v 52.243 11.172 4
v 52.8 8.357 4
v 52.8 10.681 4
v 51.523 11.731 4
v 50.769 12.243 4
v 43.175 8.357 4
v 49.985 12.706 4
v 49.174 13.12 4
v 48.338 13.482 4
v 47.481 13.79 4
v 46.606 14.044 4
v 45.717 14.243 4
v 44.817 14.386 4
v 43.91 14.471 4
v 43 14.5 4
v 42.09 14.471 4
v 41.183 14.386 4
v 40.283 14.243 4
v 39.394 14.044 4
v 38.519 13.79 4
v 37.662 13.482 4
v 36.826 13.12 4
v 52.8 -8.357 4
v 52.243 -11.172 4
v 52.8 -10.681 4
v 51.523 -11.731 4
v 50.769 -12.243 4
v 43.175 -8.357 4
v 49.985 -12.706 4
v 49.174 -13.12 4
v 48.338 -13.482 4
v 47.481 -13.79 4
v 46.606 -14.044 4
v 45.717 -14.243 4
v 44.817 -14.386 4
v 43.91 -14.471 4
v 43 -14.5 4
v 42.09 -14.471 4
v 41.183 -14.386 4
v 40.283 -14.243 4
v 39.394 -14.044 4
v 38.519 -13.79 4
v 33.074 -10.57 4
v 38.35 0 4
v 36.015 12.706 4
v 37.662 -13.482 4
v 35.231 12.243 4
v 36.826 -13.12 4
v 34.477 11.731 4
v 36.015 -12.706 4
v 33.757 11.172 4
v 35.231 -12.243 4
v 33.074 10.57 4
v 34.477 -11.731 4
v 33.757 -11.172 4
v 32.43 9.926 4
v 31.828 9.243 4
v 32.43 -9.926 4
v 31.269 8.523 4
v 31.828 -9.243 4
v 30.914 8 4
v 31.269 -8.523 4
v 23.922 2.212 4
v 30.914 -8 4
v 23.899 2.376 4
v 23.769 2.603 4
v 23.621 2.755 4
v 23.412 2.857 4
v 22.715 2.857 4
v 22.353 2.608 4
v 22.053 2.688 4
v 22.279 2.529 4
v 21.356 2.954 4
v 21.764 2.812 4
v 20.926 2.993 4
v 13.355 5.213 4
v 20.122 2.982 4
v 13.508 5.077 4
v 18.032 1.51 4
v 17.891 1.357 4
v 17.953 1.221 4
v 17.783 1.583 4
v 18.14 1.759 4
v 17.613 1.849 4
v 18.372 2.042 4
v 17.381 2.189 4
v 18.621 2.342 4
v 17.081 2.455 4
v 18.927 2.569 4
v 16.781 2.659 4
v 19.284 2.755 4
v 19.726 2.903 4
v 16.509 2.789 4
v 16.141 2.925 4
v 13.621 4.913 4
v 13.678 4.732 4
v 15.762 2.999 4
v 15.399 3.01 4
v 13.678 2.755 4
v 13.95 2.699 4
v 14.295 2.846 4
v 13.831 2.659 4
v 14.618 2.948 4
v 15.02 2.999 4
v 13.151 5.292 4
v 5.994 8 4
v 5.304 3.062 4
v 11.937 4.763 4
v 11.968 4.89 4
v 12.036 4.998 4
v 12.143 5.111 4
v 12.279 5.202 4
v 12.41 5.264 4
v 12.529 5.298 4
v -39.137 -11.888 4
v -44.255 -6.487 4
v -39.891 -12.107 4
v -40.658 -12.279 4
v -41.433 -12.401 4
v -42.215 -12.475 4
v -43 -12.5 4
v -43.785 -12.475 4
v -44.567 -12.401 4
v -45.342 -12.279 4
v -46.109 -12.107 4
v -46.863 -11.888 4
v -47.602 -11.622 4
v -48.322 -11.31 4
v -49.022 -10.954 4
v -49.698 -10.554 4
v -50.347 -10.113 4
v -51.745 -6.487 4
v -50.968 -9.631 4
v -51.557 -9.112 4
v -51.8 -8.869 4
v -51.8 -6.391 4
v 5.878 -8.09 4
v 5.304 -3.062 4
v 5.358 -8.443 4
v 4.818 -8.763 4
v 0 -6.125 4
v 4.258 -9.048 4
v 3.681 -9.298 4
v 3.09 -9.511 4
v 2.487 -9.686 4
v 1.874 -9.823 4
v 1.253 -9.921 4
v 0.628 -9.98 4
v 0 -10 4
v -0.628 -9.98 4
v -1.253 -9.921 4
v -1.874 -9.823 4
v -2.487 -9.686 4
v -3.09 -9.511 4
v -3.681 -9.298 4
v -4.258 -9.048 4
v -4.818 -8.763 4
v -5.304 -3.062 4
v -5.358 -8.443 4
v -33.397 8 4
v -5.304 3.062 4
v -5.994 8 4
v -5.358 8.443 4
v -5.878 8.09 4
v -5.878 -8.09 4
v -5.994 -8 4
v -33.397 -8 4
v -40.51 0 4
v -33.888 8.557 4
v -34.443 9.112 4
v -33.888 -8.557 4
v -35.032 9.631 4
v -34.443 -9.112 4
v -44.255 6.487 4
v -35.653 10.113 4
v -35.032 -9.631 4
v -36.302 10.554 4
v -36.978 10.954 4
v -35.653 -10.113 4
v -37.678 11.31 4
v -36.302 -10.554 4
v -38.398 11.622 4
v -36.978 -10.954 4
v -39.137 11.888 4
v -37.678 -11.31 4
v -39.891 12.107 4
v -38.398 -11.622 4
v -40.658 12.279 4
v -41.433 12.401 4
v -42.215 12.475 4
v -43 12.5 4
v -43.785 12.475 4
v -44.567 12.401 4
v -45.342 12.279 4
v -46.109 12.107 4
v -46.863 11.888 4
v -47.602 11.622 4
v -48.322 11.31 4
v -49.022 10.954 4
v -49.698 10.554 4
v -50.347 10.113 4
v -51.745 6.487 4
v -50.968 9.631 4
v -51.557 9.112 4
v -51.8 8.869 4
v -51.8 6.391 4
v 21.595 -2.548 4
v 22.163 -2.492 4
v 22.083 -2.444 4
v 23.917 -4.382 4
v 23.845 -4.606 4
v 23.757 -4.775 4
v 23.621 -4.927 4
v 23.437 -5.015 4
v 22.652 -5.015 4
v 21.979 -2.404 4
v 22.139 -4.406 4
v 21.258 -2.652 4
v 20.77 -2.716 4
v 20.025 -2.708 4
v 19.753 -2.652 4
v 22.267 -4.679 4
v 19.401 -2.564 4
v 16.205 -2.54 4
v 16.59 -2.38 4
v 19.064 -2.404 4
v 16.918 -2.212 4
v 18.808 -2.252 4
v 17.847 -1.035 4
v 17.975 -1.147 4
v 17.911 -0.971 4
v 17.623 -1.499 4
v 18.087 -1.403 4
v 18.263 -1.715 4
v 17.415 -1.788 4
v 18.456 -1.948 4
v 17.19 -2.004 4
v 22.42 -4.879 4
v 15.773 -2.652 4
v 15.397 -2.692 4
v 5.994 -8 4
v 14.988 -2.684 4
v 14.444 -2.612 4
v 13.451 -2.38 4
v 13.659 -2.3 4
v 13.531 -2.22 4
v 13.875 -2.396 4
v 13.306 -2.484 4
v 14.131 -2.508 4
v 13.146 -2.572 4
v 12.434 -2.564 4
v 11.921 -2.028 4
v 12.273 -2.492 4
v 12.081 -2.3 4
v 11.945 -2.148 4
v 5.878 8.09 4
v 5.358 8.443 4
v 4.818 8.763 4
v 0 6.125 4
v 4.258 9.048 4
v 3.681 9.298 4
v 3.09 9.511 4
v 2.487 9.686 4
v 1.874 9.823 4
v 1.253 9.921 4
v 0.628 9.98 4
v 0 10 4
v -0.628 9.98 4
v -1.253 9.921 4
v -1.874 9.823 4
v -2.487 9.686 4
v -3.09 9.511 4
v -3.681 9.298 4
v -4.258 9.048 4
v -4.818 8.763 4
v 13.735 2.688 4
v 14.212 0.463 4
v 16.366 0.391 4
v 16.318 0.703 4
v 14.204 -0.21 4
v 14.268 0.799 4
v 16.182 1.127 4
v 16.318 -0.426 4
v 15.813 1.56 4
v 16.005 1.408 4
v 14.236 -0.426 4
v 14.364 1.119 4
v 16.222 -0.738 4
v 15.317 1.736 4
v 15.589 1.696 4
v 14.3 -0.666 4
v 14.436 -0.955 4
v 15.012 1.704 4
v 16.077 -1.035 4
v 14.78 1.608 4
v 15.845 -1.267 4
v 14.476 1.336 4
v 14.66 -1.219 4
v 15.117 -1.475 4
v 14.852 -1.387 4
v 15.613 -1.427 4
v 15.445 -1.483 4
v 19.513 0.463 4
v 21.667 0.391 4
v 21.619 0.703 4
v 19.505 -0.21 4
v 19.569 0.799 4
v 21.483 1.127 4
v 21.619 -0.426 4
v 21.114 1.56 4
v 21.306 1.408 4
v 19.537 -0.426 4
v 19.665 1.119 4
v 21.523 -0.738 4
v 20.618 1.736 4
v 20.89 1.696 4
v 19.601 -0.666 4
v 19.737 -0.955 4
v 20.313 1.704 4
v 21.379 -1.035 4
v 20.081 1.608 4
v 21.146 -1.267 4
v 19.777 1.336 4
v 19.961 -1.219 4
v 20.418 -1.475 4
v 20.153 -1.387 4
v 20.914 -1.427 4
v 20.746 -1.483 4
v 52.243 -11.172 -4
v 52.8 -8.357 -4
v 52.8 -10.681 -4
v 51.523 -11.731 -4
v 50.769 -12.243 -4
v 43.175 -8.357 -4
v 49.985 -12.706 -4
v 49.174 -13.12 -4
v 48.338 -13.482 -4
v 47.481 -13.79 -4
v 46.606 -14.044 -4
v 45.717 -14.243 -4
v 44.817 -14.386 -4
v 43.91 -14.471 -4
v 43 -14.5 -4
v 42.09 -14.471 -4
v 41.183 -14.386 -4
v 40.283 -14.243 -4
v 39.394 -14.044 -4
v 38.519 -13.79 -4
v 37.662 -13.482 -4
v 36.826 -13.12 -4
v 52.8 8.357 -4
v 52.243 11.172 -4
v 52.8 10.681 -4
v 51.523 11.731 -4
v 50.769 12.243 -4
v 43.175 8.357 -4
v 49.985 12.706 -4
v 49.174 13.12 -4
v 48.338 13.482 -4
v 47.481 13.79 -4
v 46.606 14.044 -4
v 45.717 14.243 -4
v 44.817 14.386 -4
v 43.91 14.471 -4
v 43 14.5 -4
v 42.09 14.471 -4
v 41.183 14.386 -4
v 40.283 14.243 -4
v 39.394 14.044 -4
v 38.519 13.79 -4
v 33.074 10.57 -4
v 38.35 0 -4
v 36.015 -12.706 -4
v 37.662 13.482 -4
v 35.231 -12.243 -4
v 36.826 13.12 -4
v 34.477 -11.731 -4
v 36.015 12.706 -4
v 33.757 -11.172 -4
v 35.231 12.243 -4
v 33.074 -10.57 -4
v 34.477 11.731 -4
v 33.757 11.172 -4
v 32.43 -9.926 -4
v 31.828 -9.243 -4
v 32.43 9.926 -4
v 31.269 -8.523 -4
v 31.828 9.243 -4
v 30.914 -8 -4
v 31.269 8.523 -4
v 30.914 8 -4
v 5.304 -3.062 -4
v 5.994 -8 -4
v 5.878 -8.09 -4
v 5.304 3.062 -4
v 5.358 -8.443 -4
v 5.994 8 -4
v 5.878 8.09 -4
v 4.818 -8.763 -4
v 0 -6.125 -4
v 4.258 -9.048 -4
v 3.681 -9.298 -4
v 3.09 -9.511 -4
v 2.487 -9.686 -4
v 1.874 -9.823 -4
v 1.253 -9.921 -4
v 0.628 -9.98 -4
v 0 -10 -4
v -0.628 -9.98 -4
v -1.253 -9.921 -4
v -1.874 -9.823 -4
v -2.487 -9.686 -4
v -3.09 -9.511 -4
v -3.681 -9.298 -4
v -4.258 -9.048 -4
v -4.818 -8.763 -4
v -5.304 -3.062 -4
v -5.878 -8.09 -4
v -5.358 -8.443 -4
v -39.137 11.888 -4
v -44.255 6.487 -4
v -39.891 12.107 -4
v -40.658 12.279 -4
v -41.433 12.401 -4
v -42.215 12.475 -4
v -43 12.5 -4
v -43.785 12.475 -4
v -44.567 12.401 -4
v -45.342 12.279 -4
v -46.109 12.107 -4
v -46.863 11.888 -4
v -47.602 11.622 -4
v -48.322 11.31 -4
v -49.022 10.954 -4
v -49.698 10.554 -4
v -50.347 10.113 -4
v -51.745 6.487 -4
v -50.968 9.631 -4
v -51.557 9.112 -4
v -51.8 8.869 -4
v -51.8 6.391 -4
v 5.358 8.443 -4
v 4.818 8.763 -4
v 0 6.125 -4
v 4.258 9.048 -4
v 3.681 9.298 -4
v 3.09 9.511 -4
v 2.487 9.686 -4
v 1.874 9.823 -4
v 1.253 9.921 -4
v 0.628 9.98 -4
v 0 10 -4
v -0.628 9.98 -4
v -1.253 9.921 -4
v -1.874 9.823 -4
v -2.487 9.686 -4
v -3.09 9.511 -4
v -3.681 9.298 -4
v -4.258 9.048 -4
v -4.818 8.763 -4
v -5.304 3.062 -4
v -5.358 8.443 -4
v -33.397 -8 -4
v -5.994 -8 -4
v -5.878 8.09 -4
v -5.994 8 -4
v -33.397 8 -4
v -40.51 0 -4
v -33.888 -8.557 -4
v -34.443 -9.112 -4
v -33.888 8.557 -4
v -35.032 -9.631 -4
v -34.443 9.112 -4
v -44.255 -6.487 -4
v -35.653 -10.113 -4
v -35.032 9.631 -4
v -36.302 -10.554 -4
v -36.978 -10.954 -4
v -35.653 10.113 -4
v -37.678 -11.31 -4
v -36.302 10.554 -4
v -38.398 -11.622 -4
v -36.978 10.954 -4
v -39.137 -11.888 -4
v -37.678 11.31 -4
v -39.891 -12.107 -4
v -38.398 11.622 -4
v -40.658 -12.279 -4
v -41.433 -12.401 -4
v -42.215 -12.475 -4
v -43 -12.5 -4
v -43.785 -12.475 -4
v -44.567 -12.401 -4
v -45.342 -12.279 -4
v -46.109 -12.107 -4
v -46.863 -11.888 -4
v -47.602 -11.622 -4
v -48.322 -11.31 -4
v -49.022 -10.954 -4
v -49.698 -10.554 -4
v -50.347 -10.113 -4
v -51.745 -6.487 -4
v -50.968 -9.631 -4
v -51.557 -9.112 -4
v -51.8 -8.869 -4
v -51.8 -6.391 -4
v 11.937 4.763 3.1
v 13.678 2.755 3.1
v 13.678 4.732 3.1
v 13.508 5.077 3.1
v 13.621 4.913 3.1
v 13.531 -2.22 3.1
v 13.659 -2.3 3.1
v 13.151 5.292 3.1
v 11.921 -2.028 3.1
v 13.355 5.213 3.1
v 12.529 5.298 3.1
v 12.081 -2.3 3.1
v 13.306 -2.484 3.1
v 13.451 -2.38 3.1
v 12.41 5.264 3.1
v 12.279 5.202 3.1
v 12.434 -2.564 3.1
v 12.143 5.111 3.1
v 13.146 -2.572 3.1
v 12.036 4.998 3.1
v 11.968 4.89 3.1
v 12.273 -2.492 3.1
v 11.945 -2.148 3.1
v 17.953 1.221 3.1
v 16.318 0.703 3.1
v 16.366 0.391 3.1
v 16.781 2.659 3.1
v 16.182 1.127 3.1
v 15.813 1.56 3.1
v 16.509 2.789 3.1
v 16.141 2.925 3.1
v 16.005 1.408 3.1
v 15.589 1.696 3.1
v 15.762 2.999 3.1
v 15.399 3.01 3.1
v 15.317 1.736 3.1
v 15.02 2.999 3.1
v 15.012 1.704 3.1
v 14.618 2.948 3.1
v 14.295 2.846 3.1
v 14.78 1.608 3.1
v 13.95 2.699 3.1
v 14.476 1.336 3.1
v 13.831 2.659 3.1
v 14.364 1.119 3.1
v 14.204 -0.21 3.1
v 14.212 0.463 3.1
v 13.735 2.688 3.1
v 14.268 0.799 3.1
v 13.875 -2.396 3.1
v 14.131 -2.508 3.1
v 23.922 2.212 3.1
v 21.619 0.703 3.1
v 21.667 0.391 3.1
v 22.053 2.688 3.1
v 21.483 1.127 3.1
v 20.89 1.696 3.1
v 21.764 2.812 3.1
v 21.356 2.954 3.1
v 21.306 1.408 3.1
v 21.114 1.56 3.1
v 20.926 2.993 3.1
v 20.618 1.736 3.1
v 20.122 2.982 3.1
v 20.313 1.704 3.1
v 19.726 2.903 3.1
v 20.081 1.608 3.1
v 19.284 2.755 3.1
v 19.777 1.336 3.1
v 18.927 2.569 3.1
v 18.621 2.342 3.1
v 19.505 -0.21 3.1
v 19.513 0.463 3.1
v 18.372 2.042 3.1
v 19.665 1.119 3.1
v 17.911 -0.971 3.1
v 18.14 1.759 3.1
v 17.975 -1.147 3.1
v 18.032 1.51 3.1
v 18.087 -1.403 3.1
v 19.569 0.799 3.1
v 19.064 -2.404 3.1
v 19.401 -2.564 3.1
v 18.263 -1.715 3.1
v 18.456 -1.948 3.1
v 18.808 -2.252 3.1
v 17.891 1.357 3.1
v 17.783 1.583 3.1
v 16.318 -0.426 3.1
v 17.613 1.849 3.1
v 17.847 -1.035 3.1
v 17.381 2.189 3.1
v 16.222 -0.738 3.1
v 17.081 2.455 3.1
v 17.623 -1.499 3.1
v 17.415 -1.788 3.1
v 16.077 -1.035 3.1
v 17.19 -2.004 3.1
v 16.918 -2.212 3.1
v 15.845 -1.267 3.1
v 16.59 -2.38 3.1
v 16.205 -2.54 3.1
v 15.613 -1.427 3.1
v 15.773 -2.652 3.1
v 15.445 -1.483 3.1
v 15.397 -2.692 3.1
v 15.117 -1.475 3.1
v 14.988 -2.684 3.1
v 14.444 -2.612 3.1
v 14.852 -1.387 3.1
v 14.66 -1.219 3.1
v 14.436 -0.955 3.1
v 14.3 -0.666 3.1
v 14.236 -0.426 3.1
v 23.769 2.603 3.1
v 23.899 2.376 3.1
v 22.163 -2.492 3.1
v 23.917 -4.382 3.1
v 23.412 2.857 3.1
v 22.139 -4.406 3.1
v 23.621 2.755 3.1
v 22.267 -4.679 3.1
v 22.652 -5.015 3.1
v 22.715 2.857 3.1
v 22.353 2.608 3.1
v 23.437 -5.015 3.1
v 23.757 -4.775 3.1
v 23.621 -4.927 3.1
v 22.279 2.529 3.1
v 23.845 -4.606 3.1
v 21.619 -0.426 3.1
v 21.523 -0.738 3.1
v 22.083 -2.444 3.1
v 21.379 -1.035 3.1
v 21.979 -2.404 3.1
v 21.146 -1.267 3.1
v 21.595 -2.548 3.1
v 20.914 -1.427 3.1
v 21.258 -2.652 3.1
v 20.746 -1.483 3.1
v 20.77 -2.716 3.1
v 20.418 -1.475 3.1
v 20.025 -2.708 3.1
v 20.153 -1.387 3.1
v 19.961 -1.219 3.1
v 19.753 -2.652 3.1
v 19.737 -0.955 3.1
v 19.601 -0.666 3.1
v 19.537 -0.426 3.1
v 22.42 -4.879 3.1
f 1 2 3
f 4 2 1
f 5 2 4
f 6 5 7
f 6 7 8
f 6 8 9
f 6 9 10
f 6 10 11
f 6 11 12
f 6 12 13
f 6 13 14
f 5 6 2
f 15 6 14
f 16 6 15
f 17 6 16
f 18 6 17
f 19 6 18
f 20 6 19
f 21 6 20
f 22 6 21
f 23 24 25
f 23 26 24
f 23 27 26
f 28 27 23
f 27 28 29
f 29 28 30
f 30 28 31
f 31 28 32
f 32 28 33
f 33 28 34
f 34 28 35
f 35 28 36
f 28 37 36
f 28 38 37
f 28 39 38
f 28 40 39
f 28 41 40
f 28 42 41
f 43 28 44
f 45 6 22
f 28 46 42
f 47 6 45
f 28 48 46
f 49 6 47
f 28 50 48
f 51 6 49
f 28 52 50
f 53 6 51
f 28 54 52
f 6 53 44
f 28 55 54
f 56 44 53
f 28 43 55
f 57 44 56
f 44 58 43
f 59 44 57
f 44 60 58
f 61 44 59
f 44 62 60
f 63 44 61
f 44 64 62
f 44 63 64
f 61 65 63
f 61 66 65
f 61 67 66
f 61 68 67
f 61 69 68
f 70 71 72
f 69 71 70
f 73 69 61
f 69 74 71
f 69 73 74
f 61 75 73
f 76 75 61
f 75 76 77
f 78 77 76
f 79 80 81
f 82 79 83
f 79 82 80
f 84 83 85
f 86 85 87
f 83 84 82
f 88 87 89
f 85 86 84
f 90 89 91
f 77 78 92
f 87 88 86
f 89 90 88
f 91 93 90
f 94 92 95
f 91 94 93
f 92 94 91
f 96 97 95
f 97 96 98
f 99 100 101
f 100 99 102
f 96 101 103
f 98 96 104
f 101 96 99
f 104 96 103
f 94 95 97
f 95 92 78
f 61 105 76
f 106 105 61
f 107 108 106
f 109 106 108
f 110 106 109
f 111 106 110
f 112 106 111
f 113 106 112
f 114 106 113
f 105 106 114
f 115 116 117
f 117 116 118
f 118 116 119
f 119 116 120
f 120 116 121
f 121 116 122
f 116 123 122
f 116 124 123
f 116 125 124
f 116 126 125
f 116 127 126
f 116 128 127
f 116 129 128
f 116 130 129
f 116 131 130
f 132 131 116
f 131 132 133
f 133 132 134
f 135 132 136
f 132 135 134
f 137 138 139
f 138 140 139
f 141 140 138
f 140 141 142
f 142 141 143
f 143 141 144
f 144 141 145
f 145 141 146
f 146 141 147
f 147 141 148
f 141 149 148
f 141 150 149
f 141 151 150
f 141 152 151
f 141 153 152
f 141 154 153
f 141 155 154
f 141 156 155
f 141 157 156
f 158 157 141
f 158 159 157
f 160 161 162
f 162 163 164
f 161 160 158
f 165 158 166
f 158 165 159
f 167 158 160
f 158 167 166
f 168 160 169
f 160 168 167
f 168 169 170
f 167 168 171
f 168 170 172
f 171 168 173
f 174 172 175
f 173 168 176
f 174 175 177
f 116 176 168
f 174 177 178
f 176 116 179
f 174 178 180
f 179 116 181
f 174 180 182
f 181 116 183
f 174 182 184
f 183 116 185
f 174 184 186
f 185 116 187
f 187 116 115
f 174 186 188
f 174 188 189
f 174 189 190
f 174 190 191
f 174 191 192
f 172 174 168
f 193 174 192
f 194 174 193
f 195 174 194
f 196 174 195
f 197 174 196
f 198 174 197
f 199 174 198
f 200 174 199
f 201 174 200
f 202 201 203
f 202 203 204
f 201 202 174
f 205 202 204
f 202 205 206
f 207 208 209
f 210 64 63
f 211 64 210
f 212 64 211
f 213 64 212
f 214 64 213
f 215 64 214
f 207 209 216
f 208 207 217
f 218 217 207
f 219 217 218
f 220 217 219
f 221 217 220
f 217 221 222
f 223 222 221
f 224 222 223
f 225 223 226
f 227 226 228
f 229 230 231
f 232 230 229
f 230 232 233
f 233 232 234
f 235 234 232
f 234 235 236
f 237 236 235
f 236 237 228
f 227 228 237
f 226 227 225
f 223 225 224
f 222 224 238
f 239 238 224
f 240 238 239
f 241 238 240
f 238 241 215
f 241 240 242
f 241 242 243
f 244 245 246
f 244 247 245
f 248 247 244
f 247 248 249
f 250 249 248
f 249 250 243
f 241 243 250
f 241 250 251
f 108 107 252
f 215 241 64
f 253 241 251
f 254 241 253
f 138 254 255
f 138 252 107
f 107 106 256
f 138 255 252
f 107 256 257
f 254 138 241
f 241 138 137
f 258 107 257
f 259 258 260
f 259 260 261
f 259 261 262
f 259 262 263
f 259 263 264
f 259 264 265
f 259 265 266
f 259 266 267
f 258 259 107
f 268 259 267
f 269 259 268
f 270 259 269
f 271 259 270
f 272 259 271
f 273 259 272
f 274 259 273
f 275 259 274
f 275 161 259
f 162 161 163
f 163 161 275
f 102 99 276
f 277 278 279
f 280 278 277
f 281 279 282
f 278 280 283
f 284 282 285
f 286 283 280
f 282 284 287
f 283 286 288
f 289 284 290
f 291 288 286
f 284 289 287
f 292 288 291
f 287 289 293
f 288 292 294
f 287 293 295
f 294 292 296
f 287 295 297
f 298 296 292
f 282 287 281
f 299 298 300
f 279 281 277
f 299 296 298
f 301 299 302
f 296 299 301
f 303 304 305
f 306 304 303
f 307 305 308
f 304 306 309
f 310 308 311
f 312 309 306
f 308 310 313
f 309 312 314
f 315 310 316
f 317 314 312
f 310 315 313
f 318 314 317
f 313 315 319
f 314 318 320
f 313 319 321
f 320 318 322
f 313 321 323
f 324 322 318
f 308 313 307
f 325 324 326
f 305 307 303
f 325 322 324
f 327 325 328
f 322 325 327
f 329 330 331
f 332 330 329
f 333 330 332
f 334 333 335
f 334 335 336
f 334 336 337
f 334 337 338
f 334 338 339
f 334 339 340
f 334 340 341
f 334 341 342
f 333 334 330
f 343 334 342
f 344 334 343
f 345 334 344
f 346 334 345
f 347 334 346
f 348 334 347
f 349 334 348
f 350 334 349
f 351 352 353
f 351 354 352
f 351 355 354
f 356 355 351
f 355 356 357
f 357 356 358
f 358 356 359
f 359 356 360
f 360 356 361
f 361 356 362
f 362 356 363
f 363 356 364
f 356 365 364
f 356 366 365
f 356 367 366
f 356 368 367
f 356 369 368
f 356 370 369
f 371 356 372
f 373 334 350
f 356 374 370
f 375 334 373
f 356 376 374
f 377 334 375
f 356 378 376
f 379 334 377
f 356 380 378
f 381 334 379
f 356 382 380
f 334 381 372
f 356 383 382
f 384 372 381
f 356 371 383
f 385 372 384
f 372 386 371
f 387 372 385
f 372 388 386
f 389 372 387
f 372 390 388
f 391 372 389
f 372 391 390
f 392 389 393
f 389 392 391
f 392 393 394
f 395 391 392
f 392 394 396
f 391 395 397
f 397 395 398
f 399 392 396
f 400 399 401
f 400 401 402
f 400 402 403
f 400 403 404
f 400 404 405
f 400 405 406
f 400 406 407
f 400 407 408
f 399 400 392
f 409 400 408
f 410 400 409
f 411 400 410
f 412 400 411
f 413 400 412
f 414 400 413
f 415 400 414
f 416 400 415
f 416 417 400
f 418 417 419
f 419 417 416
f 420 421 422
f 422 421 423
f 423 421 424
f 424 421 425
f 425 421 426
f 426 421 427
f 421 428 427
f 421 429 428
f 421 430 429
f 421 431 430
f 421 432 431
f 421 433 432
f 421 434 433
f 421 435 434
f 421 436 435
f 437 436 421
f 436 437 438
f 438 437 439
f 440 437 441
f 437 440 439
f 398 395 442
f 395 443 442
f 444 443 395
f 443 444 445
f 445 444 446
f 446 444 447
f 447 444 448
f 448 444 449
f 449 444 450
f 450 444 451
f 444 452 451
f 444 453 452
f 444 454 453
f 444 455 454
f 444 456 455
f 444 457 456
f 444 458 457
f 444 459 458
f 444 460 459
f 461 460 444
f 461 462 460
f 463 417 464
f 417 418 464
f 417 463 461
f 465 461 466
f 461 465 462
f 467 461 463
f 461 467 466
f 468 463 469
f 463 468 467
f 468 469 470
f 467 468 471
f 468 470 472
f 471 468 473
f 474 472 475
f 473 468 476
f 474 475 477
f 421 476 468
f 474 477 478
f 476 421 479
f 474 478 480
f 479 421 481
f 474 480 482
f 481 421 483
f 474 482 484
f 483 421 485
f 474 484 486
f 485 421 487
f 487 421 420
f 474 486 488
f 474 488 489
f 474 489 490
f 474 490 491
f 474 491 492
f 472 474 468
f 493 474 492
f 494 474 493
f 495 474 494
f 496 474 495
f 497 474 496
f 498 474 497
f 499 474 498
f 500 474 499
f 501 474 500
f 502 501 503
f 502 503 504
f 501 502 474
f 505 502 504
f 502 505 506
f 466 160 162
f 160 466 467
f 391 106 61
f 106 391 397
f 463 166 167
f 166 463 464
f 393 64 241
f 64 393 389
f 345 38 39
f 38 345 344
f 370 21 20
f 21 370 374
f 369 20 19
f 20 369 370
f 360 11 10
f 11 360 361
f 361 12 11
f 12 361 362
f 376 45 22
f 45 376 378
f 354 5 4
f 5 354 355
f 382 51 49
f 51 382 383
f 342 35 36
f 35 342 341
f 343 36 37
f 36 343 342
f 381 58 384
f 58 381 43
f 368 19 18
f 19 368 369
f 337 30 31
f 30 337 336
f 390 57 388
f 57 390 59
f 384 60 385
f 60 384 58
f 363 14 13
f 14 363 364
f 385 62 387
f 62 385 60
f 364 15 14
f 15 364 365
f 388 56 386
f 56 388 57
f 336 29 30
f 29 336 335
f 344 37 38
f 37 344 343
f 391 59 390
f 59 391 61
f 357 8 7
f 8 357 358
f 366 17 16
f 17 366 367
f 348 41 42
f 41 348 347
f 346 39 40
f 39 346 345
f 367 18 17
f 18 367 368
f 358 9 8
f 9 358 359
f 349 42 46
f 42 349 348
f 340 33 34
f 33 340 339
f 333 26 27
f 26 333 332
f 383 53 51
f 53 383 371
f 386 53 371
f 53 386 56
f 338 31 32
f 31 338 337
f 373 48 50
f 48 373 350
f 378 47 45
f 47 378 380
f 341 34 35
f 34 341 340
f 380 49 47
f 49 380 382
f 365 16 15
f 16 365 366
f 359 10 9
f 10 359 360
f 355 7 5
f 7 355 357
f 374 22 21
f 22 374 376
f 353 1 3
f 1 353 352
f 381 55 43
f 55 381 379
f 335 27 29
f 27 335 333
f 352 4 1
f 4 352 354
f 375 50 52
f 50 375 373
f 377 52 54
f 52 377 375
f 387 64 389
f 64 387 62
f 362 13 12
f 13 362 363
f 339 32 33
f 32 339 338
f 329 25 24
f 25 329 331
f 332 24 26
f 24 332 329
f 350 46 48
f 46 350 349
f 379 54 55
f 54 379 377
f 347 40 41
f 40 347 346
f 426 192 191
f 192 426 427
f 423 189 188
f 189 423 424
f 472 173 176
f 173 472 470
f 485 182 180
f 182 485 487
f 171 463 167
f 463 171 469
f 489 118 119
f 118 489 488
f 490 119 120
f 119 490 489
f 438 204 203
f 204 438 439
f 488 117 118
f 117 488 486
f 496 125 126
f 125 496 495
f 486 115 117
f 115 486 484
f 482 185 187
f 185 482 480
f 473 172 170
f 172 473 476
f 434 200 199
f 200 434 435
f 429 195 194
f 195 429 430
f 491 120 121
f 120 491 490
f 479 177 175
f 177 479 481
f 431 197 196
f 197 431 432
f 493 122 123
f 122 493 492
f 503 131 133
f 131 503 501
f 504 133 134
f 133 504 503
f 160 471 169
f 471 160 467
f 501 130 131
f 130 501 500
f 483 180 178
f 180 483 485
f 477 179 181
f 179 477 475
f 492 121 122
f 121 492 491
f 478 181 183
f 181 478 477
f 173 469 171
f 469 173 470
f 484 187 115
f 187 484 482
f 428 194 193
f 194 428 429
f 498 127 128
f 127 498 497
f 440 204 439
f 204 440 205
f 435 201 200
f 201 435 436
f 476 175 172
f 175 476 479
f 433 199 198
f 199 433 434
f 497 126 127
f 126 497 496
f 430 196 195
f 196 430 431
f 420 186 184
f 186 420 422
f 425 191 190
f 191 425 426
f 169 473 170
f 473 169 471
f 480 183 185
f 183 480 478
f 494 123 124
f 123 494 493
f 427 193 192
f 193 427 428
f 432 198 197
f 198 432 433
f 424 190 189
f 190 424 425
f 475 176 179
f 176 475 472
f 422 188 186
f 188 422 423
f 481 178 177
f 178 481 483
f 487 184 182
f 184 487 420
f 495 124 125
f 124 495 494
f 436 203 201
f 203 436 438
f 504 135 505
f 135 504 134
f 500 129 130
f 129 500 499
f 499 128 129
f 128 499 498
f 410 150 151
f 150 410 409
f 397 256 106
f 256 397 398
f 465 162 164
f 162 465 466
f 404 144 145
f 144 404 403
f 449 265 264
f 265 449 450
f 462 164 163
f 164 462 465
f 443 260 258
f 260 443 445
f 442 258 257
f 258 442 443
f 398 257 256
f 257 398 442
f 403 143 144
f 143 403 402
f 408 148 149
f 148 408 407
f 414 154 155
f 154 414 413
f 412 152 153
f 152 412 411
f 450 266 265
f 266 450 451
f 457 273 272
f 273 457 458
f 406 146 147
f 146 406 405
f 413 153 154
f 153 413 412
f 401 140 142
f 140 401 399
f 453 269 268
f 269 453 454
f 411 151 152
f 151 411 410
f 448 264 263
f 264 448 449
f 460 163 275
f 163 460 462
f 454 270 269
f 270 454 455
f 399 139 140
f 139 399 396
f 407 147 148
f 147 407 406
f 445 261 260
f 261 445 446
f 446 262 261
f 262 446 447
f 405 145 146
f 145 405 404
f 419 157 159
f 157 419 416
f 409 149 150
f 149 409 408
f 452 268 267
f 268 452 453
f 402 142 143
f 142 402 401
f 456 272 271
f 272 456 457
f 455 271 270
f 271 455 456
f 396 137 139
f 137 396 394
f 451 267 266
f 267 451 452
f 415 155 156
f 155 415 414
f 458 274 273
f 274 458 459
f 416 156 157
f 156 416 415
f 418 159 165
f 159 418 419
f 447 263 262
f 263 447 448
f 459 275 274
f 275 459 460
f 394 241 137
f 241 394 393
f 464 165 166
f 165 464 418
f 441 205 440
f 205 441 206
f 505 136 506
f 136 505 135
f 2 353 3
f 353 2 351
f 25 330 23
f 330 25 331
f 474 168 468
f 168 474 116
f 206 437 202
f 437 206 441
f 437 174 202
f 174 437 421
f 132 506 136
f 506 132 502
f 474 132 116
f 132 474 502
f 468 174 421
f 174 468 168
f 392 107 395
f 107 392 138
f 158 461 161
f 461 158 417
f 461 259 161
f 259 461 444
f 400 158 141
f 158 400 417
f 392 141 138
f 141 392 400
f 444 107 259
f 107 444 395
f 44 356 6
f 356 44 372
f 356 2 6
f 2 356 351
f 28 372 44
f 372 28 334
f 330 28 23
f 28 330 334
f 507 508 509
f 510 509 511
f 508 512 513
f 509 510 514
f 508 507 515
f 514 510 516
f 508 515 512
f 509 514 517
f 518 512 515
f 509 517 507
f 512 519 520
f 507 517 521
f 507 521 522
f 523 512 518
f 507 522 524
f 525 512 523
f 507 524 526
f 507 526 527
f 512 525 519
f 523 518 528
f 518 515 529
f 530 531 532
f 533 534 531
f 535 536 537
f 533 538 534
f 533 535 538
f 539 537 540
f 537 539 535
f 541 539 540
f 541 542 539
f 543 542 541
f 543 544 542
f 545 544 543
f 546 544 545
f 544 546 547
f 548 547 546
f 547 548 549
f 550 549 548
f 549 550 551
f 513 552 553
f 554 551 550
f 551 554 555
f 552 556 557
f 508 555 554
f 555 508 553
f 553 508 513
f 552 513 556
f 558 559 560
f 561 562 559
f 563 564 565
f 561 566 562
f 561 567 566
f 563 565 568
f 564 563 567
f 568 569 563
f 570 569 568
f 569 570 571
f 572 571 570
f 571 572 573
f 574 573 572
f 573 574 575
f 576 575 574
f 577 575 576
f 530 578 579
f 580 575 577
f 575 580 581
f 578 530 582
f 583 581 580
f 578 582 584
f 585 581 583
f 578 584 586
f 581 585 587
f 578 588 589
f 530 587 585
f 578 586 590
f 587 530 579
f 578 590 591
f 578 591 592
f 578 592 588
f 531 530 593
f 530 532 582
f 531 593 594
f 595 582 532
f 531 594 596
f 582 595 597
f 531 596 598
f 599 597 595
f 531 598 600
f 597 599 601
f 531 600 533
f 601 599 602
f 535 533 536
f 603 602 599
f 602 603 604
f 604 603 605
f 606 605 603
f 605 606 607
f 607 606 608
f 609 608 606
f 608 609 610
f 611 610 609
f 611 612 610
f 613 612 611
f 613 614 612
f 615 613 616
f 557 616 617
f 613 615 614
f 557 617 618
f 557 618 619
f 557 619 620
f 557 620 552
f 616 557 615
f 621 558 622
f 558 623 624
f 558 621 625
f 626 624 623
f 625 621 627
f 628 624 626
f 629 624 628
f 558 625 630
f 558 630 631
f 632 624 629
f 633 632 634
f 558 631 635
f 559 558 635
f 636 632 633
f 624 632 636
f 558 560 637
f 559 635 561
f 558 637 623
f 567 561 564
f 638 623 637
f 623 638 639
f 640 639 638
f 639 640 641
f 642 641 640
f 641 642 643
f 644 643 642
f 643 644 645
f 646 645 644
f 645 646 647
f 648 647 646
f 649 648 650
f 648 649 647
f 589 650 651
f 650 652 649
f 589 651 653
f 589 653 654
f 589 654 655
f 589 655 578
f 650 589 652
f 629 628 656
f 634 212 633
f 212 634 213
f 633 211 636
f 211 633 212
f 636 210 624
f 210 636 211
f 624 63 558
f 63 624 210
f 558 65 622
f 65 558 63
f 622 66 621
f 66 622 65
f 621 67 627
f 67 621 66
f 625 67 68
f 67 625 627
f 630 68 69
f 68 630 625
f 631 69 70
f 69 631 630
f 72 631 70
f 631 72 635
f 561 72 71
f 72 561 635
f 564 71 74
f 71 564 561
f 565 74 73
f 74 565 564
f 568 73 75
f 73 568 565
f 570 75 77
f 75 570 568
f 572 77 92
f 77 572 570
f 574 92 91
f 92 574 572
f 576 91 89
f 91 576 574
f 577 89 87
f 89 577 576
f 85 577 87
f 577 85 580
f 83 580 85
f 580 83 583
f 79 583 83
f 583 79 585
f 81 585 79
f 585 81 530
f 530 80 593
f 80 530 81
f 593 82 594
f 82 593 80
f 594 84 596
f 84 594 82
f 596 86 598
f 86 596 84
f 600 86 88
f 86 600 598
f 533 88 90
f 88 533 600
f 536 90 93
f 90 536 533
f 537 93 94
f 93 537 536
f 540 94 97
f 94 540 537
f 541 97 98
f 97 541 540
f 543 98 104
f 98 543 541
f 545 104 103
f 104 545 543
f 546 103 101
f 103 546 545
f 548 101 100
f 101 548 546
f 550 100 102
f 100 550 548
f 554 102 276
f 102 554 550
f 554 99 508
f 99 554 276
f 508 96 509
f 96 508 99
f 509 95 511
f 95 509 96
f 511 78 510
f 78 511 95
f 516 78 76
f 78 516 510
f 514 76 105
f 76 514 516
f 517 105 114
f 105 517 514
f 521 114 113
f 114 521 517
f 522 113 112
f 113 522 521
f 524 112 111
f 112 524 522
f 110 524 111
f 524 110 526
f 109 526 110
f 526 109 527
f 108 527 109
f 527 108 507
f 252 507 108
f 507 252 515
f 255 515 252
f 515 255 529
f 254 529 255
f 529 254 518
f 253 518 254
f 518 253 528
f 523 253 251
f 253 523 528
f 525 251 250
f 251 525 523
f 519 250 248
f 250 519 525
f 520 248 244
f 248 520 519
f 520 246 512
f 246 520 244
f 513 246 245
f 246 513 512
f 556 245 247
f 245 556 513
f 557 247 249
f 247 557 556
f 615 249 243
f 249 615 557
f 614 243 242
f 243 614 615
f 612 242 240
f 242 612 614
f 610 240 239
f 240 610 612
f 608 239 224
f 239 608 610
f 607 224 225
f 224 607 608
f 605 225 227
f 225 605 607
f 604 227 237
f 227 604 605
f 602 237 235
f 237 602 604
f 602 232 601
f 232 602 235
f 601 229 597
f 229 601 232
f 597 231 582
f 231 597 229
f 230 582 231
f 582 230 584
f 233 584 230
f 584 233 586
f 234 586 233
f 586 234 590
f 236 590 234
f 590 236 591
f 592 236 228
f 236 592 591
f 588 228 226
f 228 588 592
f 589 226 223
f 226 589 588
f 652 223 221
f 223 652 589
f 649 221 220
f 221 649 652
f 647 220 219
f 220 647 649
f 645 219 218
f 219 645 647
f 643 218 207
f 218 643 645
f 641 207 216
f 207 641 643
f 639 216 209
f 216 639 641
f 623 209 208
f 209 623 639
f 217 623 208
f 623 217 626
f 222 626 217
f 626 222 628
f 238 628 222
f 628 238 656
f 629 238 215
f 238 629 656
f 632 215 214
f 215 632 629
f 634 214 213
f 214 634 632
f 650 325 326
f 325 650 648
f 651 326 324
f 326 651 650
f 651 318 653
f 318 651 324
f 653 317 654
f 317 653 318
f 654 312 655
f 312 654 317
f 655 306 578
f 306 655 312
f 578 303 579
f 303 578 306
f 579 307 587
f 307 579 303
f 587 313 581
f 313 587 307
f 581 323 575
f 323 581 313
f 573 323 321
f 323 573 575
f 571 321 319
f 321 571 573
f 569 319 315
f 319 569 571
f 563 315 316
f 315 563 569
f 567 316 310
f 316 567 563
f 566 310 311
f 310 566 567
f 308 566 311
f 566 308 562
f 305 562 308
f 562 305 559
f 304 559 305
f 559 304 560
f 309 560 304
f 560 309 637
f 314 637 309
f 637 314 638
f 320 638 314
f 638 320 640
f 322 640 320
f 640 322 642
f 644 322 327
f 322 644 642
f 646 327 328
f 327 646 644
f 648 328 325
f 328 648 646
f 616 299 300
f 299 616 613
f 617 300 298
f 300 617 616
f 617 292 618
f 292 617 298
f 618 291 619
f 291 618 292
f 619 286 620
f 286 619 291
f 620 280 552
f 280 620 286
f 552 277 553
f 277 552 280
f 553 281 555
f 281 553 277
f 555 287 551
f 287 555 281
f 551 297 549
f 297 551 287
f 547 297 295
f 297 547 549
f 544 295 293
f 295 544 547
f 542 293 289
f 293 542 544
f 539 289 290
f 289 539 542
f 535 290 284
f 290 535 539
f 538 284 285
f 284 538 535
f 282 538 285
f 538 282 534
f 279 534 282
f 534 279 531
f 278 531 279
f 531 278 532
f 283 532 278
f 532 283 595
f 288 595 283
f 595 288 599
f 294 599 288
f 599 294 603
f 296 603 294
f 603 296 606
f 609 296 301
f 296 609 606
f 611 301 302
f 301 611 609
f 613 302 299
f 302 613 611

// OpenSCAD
//---------------------------------------------------------------
//--  Llave fija impresa 10 (M6) - 13 (M8) - 17 (M10) .  (c) Pedro de Oro Martín
//---------------------------------------------------------------
//-- Released under the GPL license
//---------------------------------------------------------------


X = 0;
Y = 1;
Z = 2;


//-- Size of the logo in the dxf file
size_ini = [106.8, 91.8];

//-- Original width of the b and q lines
width = 15;

module bq_logo(lx = 12, h = 2)
{
  s = lx / size_ini[X];

  linear_extrude(height=h)
    scale([s, s, 1])
    import("bq-logo2d.dxf", layer="lines");


}


// Diametros tuercas metricas ISO 4032

DTM6 = 11.05;
DTM8 = 14.38;
DTM10 = 18.90;


// Incremento revolucionario
INCREMENTO = 0.4;

valorZ=8;

//--Lave fija

difference(){
	union(){
		difference() {
		
		union(){  
			cube([80,16,valorZ], center=true);
			
			translate([43,0,0])
			cylinder(r=14.5, h=valorZ, center=true, $fn=100);
			
			translate([-43,0,0])
			cylinder(r=12.5, h=valorZ, center=true, $fn=100);
			
			cylinder(r=10, h=valorZ, center=true, $fn=100);
			
		}
		
		 translate([-61.8,0,0.5])
		 cube([20,40,valorZ+1], center=true);
		
		 translate([62.8,0,0.5])
		 cube([20,40,valorZ+1], center=true);
		
		 // Tuerca M8
		 translate([-48,0,0.5])
		 rotate([0,0,60])
		 cylinder(h=valorZ+1, r=(DTM8*0.5)+INCREMENTO-0.1, $fn=6 , center=true);
		
		 // Tuerca M6
		 translate([0,0,0.5])
		 rotate([0,0,90])
		 cylinder(h=valorZ+1, r=(DTM6*0.5)+INCREMENTO+0.2, $fn=6 , center=true);
		
		 // Tuerca M10
		 translate([48,0,0.5])
		 rotate([0,0,60])
		 cylinder(h=valorZ+1, r=(DTM10*0.5)+INCREMENTO-0.2, $fn=6 , center=true);


	}
}

translate([18,0,3.1])
bq_logo();

}
  
